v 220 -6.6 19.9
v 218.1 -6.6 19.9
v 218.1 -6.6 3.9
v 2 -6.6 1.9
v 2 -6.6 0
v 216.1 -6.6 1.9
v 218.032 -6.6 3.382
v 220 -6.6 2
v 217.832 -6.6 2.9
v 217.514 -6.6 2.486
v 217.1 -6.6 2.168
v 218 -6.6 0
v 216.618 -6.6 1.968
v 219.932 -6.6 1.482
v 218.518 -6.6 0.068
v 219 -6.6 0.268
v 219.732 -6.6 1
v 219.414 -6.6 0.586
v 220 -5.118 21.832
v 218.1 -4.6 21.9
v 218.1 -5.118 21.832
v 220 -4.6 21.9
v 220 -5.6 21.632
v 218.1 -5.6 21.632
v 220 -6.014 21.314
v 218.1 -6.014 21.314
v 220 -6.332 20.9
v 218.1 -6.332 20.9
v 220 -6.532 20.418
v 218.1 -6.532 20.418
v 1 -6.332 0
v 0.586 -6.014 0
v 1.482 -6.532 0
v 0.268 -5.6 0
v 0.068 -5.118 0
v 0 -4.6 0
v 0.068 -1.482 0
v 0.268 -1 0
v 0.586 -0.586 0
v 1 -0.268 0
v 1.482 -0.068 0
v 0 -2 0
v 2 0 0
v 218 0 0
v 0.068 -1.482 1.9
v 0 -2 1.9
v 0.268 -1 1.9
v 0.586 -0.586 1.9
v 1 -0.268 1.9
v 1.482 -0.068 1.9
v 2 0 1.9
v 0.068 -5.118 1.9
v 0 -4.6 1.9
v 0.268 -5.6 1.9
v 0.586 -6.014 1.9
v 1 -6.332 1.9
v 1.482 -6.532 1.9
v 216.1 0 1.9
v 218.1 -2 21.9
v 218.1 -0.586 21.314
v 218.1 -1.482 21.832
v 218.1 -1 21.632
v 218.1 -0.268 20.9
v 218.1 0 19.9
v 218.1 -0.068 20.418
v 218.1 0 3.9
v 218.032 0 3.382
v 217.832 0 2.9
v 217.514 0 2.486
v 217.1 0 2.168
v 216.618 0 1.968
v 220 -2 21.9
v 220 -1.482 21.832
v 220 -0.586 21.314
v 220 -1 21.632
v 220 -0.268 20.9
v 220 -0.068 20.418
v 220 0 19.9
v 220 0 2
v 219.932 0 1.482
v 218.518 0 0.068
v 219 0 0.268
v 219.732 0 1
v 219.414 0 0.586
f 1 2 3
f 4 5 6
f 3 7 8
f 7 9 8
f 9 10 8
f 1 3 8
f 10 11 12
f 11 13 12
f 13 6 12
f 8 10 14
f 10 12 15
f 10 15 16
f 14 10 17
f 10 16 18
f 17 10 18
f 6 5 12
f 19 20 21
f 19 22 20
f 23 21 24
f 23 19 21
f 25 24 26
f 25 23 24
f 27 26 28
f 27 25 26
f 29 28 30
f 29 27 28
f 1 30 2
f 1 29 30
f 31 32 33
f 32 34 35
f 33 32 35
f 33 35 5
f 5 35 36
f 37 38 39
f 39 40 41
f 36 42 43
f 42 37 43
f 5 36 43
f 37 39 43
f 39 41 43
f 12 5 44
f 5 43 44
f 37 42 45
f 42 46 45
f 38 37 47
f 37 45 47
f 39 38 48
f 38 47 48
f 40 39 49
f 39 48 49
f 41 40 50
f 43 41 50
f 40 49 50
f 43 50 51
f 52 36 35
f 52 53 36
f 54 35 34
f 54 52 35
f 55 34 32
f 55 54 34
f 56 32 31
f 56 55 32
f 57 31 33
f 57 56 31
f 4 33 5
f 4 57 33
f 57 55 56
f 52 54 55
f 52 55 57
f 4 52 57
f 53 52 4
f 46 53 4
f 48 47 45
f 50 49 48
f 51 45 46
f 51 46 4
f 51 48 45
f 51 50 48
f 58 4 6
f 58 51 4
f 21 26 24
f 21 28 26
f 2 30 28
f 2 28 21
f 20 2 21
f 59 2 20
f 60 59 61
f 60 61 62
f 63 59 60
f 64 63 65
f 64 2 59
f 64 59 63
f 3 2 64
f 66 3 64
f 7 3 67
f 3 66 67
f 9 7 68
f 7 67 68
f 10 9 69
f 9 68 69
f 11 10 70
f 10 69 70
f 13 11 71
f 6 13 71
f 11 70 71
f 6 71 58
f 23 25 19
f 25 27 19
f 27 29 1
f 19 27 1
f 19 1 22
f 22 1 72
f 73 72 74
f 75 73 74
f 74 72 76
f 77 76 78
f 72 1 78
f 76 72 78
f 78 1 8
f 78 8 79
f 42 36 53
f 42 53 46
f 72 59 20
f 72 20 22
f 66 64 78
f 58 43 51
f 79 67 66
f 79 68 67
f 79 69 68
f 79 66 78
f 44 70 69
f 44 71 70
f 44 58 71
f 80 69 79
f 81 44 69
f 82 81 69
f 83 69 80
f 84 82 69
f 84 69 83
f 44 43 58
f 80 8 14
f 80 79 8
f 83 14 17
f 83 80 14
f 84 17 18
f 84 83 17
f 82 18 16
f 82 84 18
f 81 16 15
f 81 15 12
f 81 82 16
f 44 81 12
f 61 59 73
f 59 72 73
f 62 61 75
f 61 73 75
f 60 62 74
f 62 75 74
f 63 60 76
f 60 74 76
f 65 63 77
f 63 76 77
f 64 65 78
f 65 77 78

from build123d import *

# Parameters (mm, degrees)
F0_W     = 220
F0_H     = 6.6
F1_DEPTH = 1.9
F2_W     = 1.9
F2_H     = 6.6
F3_DEPTH = 20
F4_R     = 2


with BuildPart() as f1:
    # F0 (on Top) → F1 (new body)
    with BuildSketch(Plane.XY):
        with Locations((110, -3.3)):
            Rectangle(F0_W, F0_H)
    extrude(amount=F1_DEPTH)

    # F2 (on face) → F3 (join)
    with BuildSketch(Plane.XY.offset(1.9)):
        with Locations((219.05, -3.3)):
            Rectangle(F2_W, F2_H)
    extrude(amount=F3_DEPTH)

    # F4
    f4_edges = [f1.edges().sort_by_distance(p)[0] for p in [
        (220, -3.3, 0),
        (218.1, -3.3, 1.9),
        (219.05, -6.6, 21.9),
        (219.05, 0, 21.9),
        (0, -6.6, 0.95),
        (0, 0, 0.95),
    ]]
    fillet(f4_edges, radius=F4_R)


solid = f1.part
